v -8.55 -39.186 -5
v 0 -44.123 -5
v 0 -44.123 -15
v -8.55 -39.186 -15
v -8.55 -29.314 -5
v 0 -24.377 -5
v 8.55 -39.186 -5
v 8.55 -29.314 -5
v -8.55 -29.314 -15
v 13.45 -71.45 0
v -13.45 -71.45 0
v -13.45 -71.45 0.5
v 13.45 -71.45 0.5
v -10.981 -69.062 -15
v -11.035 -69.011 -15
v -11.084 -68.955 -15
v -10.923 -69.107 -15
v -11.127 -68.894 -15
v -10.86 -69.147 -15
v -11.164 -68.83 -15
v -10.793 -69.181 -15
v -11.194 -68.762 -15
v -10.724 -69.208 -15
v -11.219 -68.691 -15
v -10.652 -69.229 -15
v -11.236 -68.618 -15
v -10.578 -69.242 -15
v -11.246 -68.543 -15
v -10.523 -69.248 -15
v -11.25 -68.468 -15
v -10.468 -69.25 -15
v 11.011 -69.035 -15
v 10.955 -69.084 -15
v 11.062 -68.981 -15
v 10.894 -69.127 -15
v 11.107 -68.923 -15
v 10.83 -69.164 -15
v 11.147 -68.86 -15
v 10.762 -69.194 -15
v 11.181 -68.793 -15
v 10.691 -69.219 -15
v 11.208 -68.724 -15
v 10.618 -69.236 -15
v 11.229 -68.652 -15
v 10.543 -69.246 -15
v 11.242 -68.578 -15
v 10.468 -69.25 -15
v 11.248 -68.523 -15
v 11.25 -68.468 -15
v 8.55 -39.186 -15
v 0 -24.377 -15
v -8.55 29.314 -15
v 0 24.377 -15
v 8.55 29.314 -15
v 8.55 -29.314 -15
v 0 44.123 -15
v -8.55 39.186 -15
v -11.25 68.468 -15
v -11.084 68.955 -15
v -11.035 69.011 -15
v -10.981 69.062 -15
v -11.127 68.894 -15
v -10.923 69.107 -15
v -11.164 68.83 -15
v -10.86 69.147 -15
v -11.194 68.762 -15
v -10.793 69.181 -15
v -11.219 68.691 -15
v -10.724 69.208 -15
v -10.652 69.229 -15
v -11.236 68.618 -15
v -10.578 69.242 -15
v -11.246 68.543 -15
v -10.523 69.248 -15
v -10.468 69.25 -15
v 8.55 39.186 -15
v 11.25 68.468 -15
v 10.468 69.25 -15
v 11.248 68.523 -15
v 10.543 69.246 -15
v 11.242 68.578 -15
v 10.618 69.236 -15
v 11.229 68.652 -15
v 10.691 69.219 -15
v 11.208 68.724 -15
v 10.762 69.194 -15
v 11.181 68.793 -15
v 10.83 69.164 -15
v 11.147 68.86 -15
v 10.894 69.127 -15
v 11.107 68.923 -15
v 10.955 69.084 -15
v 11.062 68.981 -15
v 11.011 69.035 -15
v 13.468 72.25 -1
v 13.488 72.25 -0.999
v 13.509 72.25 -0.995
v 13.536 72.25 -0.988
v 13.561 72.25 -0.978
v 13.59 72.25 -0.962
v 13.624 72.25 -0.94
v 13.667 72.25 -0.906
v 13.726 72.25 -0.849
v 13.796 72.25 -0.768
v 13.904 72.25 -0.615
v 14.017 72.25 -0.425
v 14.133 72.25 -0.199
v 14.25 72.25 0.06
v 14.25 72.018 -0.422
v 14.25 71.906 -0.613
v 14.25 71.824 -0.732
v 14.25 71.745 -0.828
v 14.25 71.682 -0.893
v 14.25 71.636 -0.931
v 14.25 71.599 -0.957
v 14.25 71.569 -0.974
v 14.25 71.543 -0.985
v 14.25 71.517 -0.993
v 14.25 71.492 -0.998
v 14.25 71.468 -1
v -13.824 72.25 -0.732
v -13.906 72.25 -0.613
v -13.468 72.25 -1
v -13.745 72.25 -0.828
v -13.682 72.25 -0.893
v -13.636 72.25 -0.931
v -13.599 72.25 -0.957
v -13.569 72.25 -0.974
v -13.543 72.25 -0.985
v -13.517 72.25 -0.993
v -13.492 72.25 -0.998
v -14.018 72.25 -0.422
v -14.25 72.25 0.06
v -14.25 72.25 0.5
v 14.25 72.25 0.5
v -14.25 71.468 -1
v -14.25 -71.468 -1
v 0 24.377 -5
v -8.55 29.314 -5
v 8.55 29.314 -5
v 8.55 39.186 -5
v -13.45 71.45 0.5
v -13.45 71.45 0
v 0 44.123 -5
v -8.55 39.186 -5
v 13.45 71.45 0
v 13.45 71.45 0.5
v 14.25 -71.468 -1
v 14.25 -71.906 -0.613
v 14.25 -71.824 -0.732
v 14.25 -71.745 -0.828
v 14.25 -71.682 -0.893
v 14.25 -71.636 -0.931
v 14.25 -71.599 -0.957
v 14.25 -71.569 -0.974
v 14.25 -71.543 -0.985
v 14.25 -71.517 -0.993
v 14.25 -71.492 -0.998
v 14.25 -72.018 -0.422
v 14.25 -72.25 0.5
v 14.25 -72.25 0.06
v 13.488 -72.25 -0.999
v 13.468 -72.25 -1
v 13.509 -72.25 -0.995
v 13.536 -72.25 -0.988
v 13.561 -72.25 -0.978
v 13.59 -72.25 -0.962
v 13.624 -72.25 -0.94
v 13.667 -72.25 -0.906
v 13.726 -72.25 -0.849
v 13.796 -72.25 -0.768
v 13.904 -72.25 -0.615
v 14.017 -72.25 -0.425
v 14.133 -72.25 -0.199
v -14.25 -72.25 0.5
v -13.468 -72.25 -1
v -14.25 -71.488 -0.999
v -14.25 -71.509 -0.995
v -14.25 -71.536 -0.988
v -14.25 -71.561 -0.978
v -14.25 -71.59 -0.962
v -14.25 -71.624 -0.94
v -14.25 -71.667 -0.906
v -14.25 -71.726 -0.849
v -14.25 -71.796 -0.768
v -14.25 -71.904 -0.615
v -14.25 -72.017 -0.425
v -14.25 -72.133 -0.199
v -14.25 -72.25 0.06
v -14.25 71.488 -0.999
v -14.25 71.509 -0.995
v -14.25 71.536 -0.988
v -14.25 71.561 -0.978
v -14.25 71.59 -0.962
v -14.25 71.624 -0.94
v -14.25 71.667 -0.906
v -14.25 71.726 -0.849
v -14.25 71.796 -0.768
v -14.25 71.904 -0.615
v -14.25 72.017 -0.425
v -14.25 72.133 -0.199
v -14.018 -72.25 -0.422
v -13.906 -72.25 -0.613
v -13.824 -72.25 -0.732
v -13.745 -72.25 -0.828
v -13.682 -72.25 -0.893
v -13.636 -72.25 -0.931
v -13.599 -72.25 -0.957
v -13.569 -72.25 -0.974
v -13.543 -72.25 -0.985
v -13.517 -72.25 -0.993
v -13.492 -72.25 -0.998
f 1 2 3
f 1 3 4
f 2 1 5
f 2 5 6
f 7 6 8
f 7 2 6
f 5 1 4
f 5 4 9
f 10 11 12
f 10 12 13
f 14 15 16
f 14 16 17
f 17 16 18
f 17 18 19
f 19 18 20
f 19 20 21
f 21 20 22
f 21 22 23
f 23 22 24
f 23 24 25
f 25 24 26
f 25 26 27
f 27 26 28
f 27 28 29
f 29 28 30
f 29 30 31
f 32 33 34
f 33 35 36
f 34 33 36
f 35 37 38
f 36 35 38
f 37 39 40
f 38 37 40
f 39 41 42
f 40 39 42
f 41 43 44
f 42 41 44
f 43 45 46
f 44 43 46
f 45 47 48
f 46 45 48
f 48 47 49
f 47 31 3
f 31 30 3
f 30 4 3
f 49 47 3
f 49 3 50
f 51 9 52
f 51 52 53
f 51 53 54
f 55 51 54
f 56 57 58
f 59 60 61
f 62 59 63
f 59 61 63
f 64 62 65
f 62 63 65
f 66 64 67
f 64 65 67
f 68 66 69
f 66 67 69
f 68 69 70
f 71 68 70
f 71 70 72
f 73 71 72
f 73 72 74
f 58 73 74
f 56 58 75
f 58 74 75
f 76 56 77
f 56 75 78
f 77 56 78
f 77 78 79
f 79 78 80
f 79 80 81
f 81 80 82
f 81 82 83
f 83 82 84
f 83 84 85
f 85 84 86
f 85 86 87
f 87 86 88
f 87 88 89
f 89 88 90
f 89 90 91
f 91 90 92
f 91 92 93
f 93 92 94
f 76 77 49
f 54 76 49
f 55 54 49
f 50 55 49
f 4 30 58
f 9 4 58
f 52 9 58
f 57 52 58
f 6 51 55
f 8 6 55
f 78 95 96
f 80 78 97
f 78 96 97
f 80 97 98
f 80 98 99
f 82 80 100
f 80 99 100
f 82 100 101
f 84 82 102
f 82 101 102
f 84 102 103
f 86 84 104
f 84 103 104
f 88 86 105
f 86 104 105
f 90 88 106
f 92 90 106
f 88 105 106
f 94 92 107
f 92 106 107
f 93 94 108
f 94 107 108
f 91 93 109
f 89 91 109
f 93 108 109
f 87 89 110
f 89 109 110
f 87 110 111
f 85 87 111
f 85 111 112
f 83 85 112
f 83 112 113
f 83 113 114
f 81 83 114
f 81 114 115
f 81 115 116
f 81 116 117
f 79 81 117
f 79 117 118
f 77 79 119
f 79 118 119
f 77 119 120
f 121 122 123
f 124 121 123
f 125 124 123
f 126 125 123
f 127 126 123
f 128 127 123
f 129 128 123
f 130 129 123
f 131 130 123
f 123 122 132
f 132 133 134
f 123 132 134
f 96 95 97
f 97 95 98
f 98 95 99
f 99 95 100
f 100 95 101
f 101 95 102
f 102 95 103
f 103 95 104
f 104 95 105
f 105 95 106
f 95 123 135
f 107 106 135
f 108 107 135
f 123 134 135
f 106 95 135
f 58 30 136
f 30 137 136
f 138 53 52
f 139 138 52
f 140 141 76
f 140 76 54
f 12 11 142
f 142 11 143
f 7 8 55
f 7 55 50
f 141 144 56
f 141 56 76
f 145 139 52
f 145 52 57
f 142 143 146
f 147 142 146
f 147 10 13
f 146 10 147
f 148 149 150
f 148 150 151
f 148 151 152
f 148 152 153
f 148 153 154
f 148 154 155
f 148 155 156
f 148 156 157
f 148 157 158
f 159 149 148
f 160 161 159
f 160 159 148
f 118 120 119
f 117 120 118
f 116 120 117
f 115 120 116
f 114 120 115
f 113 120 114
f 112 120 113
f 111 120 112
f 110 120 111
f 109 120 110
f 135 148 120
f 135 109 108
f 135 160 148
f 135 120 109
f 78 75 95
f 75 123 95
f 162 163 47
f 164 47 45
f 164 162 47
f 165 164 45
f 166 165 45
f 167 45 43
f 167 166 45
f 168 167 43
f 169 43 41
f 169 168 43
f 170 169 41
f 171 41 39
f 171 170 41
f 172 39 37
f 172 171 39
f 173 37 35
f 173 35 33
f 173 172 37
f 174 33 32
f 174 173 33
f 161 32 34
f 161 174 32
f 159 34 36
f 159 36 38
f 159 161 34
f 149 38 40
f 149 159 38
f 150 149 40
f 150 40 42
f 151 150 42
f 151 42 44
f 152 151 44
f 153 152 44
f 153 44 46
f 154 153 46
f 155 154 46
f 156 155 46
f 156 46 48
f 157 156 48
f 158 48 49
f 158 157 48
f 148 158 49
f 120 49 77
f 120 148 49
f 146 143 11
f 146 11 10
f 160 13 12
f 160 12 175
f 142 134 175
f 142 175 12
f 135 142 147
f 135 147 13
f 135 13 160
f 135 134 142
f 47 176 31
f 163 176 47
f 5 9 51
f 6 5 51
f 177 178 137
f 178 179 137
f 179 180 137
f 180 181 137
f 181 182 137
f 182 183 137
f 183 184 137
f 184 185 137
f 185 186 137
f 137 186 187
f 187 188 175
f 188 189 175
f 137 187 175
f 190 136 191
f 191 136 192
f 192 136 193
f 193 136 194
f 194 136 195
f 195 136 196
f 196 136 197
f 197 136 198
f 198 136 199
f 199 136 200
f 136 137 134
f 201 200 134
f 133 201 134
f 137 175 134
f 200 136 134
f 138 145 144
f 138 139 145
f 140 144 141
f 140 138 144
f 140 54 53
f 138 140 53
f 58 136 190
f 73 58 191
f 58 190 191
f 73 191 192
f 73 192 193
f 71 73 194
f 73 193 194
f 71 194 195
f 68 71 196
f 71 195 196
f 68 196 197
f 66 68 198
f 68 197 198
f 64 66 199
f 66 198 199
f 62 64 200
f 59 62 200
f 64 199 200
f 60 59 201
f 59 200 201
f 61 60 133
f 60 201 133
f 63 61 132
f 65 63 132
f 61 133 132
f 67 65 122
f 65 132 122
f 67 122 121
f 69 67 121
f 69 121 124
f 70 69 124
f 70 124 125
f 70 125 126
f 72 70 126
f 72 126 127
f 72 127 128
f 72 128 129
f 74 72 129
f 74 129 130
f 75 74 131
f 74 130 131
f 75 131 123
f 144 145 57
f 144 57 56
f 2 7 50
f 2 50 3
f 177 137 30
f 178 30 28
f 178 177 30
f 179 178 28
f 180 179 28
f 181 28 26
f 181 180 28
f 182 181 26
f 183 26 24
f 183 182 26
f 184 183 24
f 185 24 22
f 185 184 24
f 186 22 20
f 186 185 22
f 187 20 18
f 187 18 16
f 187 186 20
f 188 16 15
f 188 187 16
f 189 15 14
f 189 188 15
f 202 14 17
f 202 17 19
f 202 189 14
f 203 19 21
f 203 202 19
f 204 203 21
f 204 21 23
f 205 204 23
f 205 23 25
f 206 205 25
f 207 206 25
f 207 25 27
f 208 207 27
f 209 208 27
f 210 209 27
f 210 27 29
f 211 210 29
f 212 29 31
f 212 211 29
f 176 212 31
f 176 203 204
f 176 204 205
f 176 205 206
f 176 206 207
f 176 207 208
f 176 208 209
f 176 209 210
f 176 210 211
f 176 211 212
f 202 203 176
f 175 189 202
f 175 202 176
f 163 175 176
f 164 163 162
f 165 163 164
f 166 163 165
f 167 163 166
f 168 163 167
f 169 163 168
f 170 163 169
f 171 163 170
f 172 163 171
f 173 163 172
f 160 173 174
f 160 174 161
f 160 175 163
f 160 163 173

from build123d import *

# Parameters (mm, degrees)
F1_W     = 28.5
F1_H     = 144.5
F1_W_2   = 26.9
F1_H_2   = 142.9
F2_DEPTH = 0.5
F3_DEPTH = 15
F4_SIZE2 = 14
F4_SIZE  = 3
F5_R     = 0.8
F7_DEPTH = 10


with BuildPart() as f2:
    # F1 (on Top) → F2 (new body)
    with BuildSketch(Plane.XY):
        Rectangle(F1_W, F1_H)
        Rectangle(F1_W_2, F1_H_2, mode=Mode.SUBTRACT)
    extrude(amount=F2_DEPTH)

    # F1 (on Top) → F3 (join)
    with BuildSketch(Plane.XY):
        Rectangle(F1_W, F1_H)
        Rectangle(F1_W_2, F1_H_2, mode=Mode.SUBTRACT)
        Rectangle(F1_W_2, F1_H_2)
    extrude(amount=-F3_DEPTH)

    # F4
    f4_edges = [f2.edges().sort_by_distance(p)[0] for p in [
        (0, -72.25, -15),
        (14.25, 0, -15),
        (0, 72.25, -15),
        (-14.25, 0, -15),
    ]]
    f4_side = f2.faces().sort_by_distance((0, 0, -15))[0]
    chamfer(f4_edges, length=F4_SIZE, length2=F4_SIZE2, reference=f4_side)

    # F5
    f5_edges = [f2.edges().sort_by_distance(p)[0] for p in [
        (12.75, 70.75, -8),
        (-12.75, 70.75, -8),
        (12.75, -70.75, -8),
        (-12.75, -70.75, -8),
    ]]
    fillet(f5_edges, radius=F5_R)

    # F6 (on face) → F7 (cut)
    with BuildSketch(Plane(origin=(0, 0, -15), x_dir=(1, 0, 0), z_dir=(0, 0, -1))):
        Polygon((-8.55, 39.1863448016), (-8.55, 29.3136551984), (0, 24.3773103969), (8.55, 29.3136551984), (8.55, 39.1863448016), (0, 44.1226896031), align=None)
        Polygon((-8.55, -39.1863448016), (0, -44.1226896031), (8.55, -39.1863448016), (8.55, -29.3136551984), (0, -24.3773103969), (-8.55, -29.3136551984), align=None)
    extrude(amount=-F7_DEPTH, mode=Mode.SUBTRACT)


solid = f2.part
